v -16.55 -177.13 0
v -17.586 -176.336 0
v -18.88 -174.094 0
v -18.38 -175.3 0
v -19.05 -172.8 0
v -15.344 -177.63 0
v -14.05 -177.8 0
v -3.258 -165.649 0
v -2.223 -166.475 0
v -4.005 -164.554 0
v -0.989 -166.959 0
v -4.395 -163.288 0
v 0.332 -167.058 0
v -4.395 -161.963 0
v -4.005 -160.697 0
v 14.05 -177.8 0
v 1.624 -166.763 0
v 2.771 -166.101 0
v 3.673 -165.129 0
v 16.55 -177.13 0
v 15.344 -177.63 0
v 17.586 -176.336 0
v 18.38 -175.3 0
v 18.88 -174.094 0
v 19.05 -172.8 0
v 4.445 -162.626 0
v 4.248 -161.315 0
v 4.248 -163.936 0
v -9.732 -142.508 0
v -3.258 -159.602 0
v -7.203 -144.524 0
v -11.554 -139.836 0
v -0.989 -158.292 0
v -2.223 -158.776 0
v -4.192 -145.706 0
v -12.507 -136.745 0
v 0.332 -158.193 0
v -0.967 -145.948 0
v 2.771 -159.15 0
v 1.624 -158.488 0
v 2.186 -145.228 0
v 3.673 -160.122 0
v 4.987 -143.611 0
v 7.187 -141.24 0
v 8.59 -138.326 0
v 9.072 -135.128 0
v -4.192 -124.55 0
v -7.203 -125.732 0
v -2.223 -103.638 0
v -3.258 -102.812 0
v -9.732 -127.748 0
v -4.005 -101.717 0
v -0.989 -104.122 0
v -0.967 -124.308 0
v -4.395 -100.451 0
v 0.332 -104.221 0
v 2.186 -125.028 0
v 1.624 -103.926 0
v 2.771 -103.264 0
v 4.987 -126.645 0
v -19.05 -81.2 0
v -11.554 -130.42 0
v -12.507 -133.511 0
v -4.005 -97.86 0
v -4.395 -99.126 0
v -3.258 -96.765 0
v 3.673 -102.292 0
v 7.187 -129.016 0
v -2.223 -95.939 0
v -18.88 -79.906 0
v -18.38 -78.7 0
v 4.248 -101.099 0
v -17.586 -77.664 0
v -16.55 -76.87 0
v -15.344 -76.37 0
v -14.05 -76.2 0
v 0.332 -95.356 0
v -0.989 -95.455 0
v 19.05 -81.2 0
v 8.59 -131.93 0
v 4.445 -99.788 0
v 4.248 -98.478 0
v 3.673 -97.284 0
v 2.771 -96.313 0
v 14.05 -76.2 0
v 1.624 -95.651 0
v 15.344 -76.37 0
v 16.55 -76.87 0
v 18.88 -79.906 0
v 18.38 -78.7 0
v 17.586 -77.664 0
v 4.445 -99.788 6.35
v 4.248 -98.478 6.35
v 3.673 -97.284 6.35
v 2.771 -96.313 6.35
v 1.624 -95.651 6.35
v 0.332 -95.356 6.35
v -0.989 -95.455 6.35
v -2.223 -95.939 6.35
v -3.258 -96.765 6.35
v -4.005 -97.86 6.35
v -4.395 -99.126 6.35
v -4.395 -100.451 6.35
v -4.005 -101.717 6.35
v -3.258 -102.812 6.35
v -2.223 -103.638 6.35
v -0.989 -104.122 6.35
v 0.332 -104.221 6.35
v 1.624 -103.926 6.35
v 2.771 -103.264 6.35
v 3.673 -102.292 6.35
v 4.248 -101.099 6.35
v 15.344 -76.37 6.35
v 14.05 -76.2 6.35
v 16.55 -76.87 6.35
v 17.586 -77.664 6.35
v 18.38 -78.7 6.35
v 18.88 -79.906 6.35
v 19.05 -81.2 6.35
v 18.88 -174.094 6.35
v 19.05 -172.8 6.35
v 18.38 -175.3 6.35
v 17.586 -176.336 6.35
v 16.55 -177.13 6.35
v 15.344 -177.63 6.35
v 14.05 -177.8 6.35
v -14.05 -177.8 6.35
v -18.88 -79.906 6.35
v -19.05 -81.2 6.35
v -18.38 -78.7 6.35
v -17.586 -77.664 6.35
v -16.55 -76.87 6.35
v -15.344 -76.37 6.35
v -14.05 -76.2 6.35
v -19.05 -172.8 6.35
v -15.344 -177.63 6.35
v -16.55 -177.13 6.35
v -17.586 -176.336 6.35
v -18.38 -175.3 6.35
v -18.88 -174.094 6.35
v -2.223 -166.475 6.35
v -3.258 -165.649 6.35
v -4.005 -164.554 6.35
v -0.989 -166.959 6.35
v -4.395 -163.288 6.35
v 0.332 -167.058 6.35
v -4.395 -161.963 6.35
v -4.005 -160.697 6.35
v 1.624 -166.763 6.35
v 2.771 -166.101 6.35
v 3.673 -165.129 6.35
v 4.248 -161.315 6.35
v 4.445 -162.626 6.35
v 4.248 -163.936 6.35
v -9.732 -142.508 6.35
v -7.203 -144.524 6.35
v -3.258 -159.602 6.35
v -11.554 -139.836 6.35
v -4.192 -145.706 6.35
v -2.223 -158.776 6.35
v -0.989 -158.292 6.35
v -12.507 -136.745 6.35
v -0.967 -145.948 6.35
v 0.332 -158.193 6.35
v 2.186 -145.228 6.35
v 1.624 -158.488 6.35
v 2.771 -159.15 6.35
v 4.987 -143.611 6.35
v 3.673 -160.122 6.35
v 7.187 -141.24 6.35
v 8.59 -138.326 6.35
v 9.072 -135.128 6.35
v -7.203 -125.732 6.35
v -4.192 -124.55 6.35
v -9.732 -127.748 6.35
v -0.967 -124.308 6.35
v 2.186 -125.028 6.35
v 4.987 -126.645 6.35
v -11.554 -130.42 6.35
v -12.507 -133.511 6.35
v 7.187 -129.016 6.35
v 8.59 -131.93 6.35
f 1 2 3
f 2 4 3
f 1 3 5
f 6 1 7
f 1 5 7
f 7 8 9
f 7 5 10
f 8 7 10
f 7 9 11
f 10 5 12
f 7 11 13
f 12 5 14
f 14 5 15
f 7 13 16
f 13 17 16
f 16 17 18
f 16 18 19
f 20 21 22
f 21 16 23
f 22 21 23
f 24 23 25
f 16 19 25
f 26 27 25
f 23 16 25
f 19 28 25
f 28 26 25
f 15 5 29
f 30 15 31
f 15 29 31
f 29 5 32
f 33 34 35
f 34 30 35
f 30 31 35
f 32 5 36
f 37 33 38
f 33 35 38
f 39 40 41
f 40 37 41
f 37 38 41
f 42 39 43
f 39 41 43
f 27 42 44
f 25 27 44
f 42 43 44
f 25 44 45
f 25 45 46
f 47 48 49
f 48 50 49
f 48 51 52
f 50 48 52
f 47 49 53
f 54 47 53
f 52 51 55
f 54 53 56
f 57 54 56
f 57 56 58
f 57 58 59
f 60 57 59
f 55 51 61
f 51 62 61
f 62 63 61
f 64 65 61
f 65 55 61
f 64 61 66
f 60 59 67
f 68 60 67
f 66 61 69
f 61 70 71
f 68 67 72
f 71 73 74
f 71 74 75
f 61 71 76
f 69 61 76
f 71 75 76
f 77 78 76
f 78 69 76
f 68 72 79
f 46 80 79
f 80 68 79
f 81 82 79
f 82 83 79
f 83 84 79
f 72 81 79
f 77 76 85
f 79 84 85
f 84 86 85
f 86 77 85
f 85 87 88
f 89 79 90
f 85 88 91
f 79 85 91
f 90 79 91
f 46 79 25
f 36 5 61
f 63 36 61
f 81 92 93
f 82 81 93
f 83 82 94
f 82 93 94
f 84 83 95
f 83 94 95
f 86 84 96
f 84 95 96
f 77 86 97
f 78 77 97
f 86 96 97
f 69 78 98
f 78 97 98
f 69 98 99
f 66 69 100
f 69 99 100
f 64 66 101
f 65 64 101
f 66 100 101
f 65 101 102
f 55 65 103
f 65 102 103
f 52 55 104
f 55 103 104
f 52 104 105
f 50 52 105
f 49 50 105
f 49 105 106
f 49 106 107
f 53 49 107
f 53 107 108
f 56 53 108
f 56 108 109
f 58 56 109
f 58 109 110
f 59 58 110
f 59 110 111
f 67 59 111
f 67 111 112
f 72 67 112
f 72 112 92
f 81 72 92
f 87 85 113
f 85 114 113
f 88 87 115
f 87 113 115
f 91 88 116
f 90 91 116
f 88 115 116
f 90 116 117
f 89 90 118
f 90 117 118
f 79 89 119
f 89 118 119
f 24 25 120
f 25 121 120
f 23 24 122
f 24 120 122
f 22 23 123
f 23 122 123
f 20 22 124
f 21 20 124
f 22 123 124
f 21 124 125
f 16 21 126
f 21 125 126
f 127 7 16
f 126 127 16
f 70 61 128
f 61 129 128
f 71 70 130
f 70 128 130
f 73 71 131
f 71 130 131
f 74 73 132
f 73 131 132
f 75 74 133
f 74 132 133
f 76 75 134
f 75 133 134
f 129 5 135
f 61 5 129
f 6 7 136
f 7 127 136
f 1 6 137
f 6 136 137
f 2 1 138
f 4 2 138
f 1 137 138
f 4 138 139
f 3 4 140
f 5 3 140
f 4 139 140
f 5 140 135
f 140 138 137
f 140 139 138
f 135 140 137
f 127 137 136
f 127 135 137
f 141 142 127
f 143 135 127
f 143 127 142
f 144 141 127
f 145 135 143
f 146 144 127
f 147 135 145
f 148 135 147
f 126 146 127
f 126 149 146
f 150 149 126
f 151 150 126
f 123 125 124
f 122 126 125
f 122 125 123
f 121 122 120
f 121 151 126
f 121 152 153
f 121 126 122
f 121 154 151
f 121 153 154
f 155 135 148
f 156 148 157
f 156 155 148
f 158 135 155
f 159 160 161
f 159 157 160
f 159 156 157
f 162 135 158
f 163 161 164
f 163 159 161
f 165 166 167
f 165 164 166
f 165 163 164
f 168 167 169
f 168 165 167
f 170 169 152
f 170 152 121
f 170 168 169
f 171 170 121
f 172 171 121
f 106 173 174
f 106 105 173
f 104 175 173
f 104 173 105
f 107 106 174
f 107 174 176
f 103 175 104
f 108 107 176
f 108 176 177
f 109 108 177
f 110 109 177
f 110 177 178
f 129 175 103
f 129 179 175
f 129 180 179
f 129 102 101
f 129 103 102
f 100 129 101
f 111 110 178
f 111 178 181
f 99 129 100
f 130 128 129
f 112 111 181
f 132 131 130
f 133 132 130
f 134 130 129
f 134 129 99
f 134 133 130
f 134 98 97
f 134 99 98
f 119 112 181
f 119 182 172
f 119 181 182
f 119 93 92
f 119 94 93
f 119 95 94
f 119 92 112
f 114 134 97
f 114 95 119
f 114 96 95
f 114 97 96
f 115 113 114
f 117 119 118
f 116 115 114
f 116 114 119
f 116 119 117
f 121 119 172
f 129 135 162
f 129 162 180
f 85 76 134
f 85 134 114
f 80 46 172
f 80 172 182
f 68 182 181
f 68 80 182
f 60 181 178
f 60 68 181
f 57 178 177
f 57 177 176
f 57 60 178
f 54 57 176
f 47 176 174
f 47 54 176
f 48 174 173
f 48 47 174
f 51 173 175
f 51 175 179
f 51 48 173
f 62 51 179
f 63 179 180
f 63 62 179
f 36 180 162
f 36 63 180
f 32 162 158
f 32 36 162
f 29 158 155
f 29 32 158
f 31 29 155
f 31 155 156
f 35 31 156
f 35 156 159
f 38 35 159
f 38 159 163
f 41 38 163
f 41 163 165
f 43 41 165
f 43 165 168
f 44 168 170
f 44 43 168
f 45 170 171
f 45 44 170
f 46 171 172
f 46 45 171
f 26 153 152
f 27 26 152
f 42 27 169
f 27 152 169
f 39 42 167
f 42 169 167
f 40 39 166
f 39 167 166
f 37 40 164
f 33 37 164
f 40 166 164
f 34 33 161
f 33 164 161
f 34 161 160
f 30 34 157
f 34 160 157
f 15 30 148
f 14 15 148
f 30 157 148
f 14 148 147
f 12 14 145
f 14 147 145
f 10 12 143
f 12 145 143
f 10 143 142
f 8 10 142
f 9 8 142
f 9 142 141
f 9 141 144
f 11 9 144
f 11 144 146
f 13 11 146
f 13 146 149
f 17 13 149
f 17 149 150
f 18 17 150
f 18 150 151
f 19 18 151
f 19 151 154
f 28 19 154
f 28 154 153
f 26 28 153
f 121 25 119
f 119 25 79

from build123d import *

# Parameters (mm, degrees)
SKETCH1_W           = 38.1
SKETCH1_H           = 101.6
SKETCH1_R           = 10.85
BOSS_EXTRUDE1_DEPTH = 6.35
FILLET1_R           = 5
FILLET2_R           = 5
FILLET3_R           = 5
FILLET4_R           = 5
CUT_EXTRUDE1_REACH  = 180.93
SKETCH2_R           = 4.445


with BuildPart() as part:
    # Sketch1 → Boss-Extrude1 (new body)
    with BuildSketch(Plane.XY):
        with Locations((0, -127)):
            Rectangle(SKETCH1_W, SKETCH1_H)
        with Locations((-1.778, -135.128)):
            Circle(SKETCH1_R, mode=Mode.SUBTRACT)
    extrude(amount=BOSS_EXTRUDE1_DEPTH)

    # Fillet1
    fillet1_edges = [part.edges().sort_by_distance(p)[0] for p in [
        (-19.05, -76.2, 3.175),
    ]]
    fillet(fillet1_edges, radius=FILLET1_R)

    # Fillet2
    fillet2_edges = [part.edges().sort_by_distance(p)[0] for p in [
        (19.05, -76.2, 3.175),
    ]]
    fillet(fillet2_edges, radius=FILLET2_R)

    # Fillet3
    fillet3_edges = [part.edges().sort_by_distance(p)[0] for p in [
        (19.05, -177.8, 3.175),
    ]]
    fillet(fillet3_edges, radius=FILLET3_R)

    # Fillet4
    fillet4_edges = [part.edges().sort_by_distance(p)[0] for p in [
        (-19.05, -177.8, 3.175),
    ]]
    fillet(fillet4_edges, radius=FILLET4_R)

    # Sketch2 → Cut-Extrude1 (cut, up to next)
    with BuildSketch(Plane.XY.offset(6.35), mode=Mode.PRIVATE) as cut_extrude1_sk1:
        with Locations((0, -99.788381621)):
            Circle(SKETCH2_R)
    cut_extrude1_tool1 = extrude(cut_extrude1_sk1.sketch, amount=-CUT_EXTRUDE1_REACH, mode=Mode.PRIVATE) & part.part
    # Sketch2 → Cut-Extrude1 (cut, up to next)
    with BuildSketch(Plane.XY.offset(6.35), mode=Mode.PRIVATE) as cut_extrude1_sk2:
        with Locations((0, -162.625541616)):
            Circle(SKETCH2_R)
    cut_extrude1_tool2 = extrude(cut_extrude1_sk2.sketch, amount=-CUT_EXTRUDE1_REACH, mode=Mode.PRIVATE) & part.part
    add(cut_extrude1_tool1.solids().sort_by_distance((0, -99.788382, 6.35))[0], mode=Mode.SUBTRACT)
    add(cut_extrude1_tool2.solids().sort_by_distance((0, -162.625542, 6.35))[0], mode=Mode.SUBTRACT)


solid = part.part
